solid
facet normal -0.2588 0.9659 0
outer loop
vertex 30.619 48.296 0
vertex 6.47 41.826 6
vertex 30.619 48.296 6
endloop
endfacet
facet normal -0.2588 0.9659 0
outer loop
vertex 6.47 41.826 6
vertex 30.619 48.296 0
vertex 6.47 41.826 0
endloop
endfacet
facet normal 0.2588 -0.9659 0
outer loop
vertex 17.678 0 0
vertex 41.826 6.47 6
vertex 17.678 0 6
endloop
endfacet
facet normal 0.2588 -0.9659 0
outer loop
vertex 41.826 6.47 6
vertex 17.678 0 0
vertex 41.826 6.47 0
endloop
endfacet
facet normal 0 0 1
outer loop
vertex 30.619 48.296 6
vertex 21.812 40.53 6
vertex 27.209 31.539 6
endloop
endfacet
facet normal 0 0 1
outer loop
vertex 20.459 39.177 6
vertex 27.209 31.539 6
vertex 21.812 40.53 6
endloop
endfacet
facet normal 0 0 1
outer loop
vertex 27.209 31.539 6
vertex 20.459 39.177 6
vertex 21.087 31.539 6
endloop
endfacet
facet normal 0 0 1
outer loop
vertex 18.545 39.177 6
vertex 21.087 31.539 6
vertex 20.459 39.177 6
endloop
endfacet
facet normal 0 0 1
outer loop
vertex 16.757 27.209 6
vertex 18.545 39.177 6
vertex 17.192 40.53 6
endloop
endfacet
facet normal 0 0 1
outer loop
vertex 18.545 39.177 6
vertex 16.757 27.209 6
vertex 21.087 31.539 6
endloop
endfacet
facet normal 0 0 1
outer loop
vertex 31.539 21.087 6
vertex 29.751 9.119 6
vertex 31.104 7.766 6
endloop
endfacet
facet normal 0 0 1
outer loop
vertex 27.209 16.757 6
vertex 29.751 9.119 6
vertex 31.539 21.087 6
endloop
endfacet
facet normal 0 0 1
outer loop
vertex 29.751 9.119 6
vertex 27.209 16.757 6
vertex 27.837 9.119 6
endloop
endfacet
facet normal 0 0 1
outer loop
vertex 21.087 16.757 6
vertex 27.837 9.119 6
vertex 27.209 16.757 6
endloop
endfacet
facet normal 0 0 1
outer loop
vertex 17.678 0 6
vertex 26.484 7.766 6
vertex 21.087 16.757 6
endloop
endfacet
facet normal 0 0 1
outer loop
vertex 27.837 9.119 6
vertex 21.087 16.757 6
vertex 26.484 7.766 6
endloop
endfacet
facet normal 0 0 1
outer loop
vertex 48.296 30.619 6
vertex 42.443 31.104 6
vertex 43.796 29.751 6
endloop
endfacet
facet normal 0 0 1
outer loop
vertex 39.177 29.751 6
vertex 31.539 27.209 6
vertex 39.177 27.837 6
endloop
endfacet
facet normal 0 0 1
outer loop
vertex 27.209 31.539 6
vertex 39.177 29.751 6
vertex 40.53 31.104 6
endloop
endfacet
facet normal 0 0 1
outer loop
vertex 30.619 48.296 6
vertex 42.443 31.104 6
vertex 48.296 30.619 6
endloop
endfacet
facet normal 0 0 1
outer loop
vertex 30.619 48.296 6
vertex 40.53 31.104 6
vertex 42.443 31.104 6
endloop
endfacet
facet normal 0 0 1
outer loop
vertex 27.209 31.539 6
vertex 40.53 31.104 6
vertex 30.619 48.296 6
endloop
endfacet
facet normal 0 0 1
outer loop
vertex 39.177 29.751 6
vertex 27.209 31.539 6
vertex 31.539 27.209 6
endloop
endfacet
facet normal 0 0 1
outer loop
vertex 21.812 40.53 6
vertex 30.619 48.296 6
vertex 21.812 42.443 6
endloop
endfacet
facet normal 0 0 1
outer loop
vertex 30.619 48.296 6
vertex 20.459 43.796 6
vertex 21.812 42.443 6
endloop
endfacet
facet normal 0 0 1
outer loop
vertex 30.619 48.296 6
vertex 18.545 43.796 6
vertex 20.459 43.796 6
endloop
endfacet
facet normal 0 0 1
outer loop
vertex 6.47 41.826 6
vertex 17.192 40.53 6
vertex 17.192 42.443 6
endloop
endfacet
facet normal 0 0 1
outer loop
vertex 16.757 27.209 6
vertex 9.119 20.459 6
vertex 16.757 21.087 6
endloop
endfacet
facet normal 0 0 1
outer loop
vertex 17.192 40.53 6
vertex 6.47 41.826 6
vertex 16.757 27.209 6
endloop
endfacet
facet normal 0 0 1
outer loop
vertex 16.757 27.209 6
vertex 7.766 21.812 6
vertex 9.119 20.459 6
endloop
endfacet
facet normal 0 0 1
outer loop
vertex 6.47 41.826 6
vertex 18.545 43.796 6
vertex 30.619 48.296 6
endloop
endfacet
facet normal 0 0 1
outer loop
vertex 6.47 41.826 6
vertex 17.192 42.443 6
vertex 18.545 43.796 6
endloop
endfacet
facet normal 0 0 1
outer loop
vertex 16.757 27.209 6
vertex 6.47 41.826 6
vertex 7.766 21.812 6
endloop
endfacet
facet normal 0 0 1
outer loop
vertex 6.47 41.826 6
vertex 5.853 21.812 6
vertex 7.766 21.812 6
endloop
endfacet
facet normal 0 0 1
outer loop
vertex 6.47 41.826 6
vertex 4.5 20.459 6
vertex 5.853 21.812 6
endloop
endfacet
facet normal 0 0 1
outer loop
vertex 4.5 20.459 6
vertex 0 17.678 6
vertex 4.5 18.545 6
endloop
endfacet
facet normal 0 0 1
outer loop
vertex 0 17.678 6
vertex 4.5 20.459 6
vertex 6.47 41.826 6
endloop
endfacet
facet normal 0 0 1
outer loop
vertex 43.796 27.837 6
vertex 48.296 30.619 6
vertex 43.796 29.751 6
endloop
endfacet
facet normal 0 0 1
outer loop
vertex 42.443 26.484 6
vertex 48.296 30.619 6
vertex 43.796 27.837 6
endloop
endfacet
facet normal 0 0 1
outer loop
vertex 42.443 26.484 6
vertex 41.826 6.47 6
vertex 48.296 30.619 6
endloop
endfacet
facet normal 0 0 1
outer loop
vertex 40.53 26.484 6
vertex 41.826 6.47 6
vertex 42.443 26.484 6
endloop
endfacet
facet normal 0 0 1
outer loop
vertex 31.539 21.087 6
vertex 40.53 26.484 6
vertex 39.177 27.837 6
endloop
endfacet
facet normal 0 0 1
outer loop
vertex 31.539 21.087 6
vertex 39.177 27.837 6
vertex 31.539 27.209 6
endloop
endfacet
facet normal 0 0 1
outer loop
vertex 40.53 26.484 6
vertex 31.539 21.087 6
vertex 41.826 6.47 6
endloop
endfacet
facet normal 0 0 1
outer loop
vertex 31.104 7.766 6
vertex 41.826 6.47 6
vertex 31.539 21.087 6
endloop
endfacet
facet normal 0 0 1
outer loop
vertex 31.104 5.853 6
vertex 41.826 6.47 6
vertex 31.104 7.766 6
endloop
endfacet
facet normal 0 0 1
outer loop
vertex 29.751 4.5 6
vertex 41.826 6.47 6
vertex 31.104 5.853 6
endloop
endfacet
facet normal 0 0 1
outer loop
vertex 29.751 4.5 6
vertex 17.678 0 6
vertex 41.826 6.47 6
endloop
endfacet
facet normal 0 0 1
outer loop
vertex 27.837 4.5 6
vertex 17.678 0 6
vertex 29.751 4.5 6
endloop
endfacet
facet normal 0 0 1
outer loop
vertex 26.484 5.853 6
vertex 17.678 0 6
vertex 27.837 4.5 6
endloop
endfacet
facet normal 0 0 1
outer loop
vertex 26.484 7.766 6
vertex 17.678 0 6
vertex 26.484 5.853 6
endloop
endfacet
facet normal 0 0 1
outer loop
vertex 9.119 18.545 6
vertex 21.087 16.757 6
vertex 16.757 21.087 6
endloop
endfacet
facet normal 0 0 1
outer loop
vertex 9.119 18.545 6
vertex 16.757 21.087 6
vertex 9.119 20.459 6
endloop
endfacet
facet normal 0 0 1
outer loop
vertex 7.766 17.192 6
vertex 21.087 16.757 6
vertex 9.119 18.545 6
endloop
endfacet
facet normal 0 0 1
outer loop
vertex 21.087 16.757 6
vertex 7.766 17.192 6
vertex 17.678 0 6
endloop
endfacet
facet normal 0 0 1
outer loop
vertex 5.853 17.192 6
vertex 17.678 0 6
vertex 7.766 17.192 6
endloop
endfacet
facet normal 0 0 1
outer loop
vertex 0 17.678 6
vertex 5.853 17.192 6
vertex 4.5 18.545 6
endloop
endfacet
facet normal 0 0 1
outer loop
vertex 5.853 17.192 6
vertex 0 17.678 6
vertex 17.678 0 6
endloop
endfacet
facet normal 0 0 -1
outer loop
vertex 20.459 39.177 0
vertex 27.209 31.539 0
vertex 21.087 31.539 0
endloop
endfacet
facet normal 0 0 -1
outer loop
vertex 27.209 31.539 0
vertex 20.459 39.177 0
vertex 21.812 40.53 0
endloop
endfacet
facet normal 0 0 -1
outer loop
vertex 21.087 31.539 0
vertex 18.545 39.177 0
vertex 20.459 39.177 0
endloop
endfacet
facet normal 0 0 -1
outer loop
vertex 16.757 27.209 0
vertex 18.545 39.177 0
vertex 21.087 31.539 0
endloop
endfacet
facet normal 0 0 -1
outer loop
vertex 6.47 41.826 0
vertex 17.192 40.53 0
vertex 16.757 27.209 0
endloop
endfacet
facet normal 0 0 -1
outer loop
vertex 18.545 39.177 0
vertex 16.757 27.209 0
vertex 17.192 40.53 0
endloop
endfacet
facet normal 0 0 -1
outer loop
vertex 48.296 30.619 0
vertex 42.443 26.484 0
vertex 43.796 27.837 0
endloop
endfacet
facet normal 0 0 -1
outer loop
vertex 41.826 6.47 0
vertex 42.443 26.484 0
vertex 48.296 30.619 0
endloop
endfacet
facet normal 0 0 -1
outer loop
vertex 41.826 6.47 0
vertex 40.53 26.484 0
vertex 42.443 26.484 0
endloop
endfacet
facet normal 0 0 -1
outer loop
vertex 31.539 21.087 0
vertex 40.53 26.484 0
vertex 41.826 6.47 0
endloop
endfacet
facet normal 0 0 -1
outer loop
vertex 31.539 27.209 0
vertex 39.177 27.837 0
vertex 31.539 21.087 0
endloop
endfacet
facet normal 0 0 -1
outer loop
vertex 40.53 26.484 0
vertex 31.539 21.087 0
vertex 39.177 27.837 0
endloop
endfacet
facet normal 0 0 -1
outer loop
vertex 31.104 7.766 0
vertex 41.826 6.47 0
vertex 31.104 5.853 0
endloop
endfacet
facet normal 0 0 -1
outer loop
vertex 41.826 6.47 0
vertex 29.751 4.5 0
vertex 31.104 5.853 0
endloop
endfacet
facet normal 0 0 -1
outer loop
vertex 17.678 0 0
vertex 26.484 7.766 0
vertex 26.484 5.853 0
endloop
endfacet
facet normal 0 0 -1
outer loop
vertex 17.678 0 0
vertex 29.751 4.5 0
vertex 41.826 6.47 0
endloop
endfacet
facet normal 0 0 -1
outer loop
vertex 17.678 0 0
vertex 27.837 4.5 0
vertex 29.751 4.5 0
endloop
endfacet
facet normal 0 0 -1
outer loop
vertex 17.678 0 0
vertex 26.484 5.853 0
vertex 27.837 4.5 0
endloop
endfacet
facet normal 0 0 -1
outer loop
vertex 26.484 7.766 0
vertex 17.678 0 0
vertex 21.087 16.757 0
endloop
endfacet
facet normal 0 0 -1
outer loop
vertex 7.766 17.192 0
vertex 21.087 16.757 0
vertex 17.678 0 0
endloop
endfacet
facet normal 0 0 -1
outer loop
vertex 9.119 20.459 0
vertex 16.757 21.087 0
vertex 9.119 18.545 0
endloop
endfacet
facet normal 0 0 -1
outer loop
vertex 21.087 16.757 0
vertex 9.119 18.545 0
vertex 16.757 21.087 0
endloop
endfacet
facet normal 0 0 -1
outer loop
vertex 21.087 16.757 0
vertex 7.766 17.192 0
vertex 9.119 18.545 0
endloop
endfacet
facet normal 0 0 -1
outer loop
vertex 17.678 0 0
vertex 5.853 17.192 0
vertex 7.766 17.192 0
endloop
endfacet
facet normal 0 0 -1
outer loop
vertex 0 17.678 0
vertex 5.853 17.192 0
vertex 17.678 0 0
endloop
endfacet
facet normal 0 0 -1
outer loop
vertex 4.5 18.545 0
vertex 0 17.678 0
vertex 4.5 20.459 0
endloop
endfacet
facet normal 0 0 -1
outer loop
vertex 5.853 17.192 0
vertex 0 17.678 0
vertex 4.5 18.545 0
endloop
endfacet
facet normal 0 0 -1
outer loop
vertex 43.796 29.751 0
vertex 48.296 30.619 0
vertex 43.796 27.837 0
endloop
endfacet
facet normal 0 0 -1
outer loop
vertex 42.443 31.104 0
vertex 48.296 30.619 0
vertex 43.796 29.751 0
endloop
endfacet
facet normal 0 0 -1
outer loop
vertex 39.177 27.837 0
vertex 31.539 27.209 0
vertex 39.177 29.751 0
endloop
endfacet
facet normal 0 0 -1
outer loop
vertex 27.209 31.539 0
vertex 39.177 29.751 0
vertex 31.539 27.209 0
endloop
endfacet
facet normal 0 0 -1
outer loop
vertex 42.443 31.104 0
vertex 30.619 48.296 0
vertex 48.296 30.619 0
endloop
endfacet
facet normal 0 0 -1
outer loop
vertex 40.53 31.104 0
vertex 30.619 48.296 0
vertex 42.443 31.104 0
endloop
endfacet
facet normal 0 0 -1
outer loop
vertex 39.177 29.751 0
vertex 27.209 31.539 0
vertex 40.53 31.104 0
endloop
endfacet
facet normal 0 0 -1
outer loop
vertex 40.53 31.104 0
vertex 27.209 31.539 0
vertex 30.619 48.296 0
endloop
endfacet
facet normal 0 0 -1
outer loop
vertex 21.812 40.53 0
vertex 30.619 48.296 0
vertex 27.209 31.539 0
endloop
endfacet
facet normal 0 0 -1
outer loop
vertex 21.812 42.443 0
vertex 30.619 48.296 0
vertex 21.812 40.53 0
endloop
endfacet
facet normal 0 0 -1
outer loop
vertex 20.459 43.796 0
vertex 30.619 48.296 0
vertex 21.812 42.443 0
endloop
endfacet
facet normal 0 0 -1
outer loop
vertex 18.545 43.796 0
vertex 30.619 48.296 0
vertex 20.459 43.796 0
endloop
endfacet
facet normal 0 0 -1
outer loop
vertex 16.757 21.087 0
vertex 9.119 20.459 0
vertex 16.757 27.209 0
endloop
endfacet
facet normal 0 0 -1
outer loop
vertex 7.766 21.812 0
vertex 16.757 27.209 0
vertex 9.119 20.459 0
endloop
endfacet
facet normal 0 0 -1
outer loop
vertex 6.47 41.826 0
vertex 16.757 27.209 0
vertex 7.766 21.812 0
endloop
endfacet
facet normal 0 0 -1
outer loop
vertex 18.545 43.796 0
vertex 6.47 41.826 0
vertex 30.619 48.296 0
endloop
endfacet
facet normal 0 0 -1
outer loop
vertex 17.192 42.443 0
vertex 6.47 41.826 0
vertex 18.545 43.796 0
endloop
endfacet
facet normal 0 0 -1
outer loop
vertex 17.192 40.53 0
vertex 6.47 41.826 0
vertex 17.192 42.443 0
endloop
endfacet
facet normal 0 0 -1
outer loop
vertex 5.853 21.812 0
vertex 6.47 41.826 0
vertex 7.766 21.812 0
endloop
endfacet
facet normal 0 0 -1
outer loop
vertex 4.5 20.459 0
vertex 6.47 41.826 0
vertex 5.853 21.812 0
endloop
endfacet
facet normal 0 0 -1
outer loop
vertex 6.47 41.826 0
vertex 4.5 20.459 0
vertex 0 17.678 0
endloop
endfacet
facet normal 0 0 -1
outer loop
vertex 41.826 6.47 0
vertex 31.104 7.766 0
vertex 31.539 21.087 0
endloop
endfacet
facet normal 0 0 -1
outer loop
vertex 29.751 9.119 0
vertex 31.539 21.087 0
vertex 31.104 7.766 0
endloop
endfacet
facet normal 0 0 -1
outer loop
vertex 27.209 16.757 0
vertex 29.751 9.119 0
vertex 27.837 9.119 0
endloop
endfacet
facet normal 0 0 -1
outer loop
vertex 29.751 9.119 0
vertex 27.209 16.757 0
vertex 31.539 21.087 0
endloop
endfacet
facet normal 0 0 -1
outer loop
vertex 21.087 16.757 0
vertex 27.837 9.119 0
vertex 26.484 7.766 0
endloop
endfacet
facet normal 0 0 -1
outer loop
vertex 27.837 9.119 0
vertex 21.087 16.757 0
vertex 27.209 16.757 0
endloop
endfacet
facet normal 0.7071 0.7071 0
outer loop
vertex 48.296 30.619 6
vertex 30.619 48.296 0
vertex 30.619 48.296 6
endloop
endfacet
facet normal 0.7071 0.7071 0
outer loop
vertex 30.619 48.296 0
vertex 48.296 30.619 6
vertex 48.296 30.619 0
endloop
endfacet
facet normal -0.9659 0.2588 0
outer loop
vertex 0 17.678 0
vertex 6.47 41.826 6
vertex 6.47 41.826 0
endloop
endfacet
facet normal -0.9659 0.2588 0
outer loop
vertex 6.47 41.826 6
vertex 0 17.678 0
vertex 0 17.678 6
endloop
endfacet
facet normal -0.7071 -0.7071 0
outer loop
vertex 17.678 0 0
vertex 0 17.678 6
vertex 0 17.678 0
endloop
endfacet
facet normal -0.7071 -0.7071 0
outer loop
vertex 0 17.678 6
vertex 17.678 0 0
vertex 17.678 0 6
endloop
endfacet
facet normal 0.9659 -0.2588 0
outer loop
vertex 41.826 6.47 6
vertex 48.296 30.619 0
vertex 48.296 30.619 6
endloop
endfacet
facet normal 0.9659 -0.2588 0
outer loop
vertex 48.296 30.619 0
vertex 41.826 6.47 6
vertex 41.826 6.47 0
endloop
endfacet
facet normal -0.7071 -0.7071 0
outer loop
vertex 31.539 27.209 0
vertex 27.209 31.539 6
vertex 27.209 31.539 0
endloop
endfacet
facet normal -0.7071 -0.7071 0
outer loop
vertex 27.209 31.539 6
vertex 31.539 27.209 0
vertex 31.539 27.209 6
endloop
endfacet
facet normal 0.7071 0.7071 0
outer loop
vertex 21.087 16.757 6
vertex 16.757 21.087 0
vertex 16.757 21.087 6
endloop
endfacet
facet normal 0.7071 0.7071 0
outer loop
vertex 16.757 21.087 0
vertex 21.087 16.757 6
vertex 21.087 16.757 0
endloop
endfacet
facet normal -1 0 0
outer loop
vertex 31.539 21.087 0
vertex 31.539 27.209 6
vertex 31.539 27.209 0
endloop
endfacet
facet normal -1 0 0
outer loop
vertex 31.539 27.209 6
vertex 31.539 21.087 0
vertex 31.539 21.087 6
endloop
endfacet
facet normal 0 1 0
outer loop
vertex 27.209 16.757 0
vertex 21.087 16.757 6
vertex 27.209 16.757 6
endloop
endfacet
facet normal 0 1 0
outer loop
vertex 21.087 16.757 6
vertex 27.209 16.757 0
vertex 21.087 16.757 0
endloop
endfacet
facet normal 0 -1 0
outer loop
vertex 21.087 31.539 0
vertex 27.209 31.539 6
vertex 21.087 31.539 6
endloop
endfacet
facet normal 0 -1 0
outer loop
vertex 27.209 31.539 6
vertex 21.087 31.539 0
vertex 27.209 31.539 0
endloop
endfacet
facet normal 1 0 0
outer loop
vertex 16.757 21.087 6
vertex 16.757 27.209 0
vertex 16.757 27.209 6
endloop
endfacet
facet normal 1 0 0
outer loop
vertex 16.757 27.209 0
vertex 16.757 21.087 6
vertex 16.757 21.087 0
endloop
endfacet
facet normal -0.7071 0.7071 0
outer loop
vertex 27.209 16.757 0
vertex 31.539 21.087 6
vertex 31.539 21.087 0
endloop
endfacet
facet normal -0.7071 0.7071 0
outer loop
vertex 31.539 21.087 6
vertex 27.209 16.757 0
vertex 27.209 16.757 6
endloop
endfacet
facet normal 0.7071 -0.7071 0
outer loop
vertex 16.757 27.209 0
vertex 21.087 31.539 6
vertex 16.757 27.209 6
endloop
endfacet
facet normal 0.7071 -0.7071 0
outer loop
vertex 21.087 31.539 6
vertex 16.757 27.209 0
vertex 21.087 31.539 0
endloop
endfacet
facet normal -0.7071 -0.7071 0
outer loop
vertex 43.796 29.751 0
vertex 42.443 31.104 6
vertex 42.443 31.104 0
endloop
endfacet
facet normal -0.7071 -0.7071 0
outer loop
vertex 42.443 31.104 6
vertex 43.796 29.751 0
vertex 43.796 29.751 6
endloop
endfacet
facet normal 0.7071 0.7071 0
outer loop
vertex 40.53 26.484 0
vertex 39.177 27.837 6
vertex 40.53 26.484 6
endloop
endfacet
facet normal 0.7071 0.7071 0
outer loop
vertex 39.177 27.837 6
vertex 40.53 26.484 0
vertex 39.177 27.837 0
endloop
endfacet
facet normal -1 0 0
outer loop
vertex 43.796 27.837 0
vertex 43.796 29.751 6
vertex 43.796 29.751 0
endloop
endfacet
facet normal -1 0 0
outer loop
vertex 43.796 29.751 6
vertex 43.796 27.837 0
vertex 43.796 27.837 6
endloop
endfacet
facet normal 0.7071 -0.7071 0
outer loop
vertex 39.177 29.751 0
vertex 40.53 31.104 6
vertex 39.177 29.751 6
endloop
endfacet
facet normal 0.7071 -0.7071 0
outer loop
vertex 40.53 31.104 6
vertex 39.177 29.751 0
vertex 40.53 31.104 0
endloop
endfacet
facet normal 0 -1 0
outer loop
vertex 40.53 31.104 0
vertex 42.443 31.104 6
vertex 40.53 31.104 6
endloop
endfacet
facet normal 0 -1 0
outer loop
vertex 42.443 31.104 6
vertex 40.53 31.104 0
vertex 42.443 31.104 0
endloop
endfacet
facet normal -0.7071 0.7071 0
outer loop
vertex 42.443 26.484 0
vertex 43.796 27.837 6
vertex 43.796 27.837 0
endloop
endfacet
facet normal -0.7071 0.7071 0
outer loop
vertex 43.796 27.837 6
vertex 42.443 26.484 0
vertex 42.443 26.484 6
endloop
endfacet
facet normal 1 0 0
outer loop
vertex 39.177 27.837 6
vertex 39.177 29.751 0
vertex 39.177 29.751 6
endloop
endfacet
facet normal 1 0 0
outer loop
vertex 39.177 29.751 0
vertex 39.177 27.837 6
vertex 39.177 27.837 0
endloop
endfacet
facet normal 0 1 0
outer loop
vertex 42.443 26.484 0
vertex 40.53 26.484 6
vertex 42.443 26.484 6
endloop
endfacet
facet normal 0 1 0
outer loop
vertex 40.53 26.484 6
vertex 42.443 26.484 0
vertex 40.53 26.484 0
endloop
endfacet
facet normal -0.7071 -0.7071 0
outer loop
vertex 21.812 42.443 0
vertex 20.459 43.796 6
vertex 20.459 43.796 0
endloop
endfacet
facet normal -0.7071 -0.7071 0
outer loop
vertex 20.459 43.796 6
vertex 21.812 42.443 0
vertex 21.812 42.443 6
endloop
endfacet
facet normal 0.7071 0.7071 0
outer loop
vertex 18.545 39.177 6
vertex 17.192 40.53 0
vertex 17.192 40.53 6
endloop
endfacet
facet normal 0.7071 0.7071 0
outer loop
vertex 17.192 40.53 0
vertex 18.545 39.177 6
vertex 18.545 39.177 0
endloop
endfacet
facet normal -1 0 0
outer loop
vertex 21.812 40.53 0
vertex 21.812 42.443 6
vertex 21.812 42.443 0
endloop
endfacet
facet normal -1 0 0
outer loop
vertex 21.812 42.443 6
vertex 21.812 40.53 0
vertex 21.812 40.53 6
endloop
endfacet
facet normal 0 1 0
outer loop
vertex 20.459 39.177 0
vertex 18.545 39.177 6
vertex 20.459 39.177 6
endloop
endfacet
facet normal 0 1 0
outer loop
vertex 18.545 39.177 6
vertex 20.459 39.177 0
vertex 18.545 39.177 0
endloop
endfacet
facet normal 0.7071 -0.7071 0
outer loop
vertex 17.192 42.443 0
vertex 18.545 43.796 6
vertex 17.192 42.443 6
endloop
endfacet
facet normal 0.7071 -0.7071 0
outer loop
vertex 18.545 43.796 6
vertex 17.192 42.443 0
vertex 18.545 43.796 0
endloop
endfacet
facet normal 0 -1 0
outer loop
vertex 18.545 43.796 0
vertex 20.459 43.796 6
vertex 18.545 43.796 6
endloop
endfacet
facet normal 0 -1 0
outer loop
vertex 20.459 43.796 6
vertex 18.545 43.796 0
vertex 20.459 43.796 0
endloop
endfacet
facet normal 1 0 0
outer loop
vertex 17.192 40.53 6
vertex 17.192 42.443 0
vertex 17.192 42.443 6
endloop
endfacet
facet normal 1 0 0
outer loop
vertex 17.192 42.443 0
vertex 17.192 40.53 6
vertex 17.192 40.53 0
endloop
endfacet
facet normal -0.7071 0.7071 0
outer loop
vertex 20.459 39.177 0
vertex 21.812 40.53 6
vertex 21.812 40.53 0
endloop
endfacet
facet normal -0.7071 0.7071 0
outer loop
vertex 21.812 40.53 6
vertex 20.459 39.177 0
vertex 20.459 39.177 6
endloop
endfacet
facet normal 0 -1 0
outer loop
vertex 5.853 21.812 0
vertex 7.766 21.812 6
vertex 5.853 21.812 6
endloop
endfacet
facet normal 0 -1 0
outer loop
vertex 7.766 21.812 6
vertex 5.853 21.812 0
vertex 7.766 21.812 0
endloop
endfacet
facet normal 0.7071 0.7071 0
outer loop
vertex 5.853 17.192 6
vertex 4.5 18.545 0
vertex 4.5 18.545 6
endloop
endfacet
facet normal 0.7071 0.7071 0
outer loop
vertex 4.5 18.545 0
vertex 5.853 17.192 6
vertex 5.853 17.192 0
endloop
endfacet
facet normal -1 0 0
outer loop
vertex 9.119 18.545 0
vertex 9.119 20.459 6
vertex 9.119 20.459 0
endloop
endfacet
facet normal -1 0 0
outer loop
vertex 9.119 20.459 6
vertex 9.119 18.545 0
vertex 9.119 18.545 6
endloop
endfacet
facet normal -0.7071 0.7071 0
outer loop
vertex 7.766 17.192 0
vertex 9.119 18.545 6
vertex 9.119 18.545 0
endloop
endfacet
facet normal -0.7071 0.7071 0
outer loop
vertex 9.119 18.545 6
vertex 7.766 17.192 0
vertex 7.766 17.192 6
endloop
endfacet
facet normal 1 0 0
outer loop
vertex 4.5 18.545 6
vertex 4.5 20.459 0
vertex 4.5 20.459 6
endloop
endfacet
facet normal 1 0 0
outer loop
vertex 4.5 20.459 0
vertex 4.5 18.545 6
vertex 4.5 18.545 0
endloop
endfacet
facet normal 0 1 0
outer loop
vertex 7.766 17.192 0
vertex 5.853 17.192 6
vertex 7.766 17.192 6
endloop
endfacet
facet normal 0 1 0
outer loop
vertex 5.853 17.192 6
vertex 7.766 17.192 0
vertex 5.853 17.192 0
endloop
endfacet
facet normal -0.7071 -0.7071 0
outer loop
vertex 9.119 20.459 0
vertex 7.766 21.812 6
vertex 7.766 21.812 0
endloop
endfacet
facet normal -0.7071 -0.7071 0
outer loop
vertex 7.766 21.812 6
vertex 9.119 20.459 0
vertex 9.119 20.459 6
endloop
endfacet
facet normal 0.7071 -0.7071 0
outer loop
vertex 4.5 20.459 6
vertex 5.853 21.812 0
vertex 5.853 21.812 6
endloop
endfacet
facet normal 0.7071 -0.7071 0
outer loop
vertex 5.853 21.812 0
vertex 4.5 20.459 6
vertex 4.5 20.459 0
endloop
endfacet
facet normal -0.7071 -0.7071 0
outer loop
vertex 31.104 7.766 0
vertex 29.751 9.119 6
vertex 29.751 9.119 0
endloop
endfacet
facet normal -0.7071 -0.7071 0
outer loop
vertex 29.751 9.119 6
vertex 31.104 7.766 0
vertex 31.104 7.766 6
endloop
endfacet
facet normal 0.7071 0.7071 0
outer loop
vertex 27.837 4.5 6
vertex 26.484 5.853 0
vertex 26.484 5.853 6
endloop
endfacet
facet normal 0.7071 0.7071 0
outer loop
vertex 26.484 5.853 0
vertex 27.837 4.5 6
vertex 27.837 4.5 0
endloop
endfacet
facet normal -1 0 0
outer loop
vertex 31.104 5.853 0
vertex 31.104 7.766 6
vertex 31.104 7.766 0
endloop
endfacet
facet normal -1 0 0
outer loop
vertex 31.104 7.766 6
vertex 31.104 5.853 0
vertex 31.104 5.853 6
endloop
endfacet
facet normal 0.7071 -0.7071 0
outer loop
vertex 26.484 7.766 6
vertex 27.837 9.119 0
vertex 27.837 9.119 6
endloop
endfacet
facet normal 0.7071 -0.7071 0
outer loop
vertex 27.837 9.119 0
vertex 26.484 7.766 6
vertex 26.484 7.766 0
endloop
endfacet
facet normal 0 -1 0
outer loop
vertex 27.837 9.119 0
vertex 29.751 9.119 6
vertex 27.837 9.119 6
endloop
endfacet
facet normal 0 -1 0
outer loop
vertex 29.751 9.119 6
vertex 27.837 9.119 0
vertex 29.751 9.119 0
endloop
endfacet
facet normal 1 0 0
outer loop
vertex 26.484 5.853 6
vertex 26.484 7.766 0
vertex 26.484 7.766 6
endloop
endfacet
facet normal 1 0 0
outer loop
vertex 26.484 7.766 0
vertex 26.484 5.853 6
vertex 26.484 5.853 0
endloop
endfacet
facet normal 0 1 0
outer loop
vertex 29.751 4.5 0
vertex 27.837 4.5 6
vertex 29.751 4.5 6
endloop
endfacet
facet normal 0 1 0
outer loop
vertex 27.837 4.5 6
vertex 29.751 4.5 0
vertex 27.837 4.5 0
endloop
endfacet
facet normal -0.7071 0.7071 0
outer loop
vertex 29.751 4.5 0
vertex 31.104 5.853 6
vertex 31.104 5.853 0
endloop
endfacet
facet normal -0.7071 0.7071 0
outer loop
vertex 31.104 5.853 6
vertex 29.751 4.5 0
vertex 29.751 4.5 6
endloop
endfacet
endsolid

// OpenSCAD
$fn = 32;

// ----------------------------------------------------------------------
// Polygon plate: 6-gon R25, 4 bolt windows
// ----------------------------------------------------------------------

// --- parameters (mm) ---
sides = 6;                // number of polygon sides
plate_r = 25;             // circumscribed radius of the polygon
bore_r = 8;               // centre bore radius
bolts = 4;                // number of bolt windows
ring_r = 17.95;           // bolt-circle radius
bolt_r = 2.5;             // bolt window radius
plate_t = 6;              // plate thickness, Z (extrusion height)

plate_d = 2 * plate_r;  // circumscribed diameter
bore_d = 2 * bore_r;  // centre bore diameter
bolt_d = 2 * bolt_r;  // bolt window diameter
ring_d = 2 * ring_r;  // bolt-circle diameter

profile = [[48.296, 30.619], [30.619, 48.296], [6.47, 41.826], [0, 17.678], [17.678, 0], [41.826, 6.47]];  // primary outline, 6 points, counter clockwise
void_1 = [[31.539, 27.209], [27.209, 31.539], [21.087, 31.539], [16.757, 27.209], [16.757, 21.087], [21.087, 16.757], [27.209, 16.757], [31.539, 21.087]];  // centre bore, 8 points
void_2 = [[43.796, 29.751], [42.443, 31.104], [40.53, 31.104], [39.177, 29.751], [39.177, 27.837], [40.53, 26.484], [42.443, 26.484], [43.796, 27.837]];  // bolt window 1, 8 points
void_3 = [[21.812, 42.443], [20.459, 43.796], [18.545, 43.796], [17.192, 42.443], [17.192, 40.53], [18.545, 39.177], [20.459, 39.177], [21.812, 40.53]];  // bolt window 2, 8 points
void_4 = [[9.119, 20.459], [7.766, 21.812], [5.853, 21.812], [4.5, 20.459], [4.5, 18.545], [5.853, 17.192], [7.766, 17.192], [9.119, 18.545]];  // bolt window 3, 8 points
void_5 = [[31.104, 7.766], [29.751, 9.119], [27.837, 9.119], [26.484, 7.766], [26.484, 5.853], [27.837, 4.5], [29.751, 4.5], [31.104, 5.853]];  // bolt window 4, 8 points

// --- the one profile operation ---
difference() {
  linear_extrude(height = plate_t) polygon(points = profile);
  translate([0, 0, -1])
    linear_extrude(height = plate_t + 2) polygon(points = void_1);
  translate([0, 0, -1])
    linear_extrude(height = plate_t + 2) polygon(points = void_2);
  translate([0, 0, -1])
    linear_extrude(height = plate_t + 2) polygon(points = void_3);
  translate([0, 0, -1])
    linear_extrude(height = plate_t + 2) polygon(points = void_4);
  translate([0, 0, -1])
    linear_extrude(height = plate_t + 2) polygon(points = void_5);
}
